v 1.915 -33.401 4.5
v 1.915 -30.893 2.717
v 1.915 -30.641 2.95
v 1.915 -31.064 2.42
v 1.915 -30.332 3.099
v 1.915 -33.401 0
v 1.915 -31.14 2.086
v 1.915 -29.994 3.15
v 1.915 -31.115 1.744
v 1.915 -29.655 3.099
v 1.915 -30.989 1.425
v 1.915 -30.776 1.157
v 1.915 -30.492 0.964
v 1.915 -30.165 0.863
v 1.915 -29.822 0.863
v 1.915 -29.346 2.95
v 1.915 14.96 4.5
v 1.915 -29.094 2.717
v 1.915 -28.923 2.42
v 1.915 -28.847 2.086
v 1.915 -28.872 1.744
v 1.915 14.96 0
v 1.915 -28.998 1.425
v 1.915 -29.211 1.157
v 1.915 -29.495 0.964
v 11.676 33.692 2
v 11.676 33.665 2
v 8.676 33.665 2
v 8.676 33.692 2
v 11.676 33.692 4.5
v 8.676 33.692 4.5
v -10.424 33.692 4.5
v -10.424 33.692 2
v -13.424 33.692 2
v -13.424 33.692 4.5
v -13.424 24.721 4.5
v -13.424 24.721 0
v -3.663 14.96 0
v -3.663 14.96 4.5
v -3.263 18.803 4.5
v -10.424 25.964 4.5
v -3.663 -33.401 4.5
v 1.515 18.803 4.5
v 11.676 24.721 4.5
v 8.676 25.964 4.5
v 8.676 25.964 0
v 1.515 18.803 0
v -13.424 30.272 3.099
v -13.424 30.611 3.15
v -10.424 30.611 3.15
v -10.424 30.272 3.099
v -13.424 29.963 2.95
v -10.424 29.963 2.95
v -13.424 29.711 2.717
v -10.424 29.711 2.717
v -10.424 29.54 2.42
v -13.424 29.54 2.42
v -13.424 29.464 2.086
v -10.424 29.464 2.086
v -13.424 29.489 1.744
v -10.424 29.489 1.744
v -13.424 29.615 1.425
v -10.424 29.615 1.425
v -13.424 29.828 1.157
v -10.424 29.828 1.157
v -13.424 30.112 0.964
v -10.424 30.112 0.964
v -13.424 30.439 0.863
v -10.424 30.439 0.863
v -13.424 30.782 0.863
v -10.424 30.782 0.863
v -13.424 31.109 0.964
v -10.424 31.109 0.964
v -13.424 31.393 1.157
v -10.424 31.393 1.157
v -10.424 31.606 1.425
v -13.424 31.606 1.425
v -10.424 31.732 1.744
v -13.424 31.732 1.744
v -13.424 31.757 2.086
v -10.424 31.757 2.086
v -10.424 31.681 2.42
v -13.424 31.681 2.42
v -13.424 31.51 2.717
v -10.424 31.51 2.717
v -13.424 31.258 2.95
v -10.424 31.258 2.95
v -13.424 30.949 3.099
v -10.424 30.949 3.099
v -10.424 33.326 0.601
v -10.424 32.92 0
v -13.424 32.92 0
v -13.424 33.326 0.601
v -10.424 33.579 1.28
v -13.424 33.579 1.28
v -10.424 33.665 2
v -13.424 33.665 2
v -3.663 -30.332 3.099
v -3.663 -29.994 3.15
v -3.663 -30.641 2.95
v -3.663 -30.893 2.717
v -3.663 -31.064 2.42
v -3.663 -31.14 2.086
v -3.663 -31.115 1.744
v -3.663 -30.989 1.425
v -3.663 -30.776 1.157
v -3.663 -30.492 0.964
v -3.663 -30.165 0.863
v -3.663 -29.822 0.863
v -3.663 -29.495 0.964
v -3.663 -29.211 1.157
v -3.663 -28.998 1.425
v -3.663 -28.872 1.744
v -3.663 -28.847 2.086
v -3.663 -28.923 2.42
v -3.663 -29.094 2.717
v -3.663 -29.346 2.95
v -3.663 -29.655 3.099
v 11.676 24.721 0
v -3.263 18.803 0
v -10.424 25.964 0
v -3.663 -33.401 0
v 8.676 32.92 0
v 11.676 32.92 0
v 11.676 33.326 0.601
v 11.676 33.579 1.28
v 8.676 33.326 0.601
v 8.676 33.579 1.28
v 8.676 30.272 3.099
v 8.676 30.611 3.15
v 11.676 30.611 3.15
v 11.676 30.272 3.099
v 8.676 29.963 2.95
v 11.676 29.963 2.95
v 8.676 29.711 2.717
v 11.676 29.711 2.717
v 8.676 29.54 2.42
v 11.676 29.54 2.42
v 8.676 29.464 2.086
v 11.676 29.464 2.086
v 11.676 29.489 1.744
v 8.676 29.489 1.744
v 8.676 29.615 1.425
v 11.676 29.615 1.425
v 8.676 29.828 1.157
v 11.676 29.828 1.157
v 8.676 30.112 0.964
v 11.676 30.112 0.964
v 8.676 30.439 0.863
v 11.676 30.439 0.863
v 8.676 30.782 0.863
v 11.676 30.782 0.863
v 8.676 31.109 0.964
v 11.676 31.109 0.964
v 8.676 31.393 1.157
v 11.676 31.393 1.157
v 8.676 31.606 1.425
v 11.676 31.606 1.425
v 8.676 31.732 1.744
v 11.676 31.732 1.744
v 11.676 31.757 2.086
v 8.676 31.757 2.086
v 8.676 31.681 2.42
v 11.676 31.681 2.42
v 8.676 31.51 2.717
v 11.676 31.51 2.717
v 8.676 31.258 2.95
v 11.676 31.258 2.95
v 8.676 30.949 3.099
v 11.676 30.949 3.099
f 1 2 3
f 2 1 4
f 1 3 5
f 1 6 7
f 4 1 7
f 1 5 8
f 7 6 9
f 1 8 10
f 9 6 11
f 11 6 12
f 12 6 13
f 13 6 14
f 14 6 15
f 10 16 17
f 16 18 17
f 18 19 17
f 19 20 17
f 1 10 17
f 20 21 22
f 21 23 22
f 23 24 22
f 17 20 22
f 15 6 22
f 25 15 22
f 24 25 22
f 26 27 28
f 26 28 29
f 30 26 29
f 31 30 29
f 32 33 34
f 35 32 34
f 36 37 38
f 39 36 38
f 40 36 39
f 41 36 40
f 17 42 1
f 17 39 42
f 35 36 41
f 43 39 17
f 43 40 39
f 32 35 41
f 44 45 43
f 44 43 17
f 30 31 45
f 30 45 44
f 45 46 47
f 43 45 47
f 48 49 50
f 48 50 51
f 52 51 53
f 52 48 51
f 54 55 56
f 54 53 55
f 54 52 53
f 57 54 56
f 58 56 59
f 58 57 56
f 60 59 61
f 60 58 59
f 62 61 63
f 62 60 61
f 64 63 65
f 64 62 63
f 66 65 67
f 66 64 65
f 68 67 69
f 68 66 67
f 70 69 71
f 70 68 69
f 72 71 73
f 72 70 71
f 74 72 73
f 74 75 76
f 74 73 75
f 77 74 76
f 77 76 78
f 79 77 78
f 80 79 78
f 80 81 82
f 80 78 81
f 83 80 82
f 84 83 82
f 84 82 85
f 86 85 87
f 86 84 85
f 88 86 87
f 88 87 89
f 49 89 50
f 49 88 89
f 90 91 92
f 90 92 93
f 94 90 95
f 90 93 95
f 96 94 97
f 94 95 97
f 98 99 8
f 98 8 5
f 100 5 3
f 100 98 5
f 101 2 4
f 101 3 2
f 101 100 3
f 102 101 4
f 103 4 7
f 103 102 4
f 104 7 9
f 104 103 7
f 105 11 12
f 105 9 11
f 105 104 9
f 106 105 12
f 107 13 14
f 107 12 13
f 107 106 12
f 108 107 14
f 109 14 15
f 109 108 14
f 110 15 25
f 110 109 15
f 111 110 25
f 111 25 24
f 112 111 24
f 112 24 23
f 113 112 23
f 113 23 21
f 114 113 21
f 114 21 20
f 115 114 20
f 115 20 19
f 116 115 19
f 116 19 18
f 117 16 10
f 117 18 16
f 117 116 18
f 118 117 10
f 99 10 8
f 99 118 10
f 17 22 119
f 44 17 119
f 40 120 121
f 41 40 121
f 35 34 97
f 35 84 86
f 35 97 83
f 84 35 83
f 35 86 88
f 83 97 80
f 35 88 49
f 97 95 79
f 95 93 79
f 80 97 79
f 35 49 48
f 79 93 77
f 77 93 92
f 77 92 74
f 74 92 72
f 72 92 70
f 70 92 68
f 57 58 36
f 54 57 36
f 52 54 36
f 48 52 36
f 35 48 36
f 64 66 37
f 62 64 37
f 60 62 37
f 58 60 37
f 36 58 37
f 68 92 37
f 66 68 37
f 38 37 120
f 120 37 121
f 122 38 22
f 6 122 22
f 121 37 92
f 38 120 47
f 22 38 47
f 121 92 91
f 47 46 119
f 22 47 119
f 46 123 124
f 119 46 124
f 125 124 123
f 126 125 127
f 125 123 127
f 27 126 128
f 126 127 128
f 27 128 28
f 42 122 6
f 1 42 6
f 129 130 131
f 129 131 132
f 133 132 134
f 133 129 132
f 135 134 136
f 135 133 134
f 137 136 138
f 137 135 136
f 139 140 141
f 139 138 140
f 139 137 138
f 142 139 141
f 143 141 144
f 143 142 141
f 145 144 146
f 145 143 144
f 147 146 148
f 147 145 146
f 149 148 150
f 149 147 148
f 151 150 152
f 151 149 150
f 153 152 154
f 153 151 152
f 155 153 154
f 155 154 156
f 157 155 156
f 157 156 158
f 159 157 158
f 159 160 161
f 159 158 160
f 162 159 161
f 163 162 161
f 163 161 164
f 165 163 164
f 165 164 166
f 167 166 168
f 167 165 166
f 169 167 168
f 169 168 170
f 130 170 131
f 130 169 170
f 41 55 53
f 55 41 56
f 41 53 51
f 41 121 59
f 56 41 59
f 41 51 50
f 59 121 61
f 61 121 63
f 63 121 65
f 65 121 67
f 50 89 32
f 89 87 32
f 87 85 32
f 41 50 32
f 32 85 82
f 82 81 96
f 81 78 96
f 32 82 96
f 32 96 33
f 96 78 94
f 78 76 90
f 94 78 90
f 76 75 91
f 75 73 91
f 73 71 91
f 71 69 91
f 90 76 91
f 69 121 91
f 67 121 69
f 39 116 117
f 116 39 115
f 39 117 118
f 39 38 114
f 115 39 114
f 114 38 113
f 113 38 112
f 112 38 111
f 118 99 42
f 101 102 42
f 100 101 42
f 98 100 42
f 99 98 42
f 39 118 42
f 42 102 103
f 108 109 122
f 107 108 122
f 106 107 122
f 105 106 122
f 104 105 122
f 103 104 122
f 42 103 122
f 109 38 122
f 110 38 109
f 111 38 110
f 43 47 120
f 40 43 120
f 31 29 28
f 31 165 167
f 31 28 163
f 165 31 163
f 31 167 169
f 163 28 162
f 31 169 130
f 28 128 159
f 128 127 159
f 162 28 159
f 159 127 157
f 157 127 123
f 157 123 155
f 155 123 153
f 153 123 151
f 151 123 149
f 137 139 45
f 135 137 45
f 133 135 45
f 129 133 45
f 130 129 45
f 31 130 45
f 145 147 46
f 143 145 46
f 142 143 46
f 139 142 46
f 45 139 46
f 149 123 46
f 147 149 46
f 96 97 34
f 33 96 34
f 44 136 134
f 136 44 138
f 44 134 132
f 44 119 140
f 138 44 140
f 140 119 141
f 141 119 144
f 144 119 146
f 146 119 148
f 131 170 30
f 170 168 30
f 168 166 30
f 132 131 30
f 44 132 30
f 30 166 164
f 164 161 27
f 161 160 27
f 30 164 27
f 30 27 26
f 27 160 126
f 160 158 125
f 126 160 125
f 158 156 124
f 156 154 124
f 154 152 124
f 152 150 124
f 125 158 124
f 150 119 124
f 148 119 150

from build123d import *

# Parameters (mm, degrees)
EXTRUDE_1_DEPTH          = 4.5
CUT_EXTRUDE_1_DEPTH      = 100
CUT_EXTRUDE_1_DEPTH_BACK = 100
SKETCH_2_R               = 1.150000595
SKETCH_2_R_2             = 1.150000006
CUT_EXTRUDE_2_DEPTH      = 100
CUT_EXTRUDE_2_DEPTH_BACK = 10


with BuildPart() as part:
    # 草图1 → 凸台-拉伸1 (new body)
    with BuildSketch(Plane.XY):
        Polygon((-3.663147943, -33.4008975), (1.914578421, -33.4008975), (1.914578421, 14.960326674), (11.675714921, 24.721462524), (11.675714921, 33.692325595), (8.675714, 33.692325595), (8.675714, 25.964104178), (1.514824851, 18.803215506), (-3.263396279, 18.803215506), (-10.424284951, 25.964104655), (-10.424284951, 33.692326072), (-13.424284951, 33.692326072), (-13.424284951, 24.721463921), (-3.663147943, 14.960326674), align=None)
    extrude(amount=EXTRUDE_1_DEPTH)

    # 草图2 → 切除-拉伸1 (cut, two sides: drawn at the far end of the back side and taken through both)
    with BuildSketch(Plane(origin=(0, 0, 0), x_dir=(0, 0, -1), z_dir=(1, 0, 0)).offset(-CUT_EXTRUDE_1_DEPTH_BACK)):
        with Locations(Location((-2.000000723, -29.993528863, 0), (0, 0, 180))):
            Circle(SKETCH_2_R)
        with Locations(Location((-2.000000233, 30.610505435, 0), (0, 0, 180))):
            Circle(SKETCH_2_R_2)
    extrude(amount=CUT_EXTRUDE_1_DEPTH + CUT_EXTRUDE_1_DEPTH_BACK, mode=Mode.SUBTRACT)

    # 草图3 → 切除-拉伸2 (cut, two sides: drawn at the far end of the back side and taken through both)
    with BuildSketch(Plane(origin=(-10.424284951, 0, 0), x_dir=(0, 0, -1), z_dir=(1, 0, 0)).offset(-CUT_EXTRUDE_2_DEPTH_BACK)):
        with BuildLine():
            Line((-2.000000233, 33.665271008), (-2.000000233, 37.690968831))
            ThreePointArc((-2.000000233, 37.690968831), (3.006643449, 35.617149116), (5.080463163, 30.610505435))
            Line((5.080463163, 30.610505435), (1.05476534, 30.610505435))
            ThreePointArc((1.05476534, 30.610505435), (0.160045219, 32.770550887), (-2.000000233, 33.665271008))
        make_face()
    extrude(amount=CUT_EXTRUDE_2_DEPTH + CUT_EXTRUDE_2_DEPTH_BACK, mode=Mode.SUBTRACT)


solid = part.part
